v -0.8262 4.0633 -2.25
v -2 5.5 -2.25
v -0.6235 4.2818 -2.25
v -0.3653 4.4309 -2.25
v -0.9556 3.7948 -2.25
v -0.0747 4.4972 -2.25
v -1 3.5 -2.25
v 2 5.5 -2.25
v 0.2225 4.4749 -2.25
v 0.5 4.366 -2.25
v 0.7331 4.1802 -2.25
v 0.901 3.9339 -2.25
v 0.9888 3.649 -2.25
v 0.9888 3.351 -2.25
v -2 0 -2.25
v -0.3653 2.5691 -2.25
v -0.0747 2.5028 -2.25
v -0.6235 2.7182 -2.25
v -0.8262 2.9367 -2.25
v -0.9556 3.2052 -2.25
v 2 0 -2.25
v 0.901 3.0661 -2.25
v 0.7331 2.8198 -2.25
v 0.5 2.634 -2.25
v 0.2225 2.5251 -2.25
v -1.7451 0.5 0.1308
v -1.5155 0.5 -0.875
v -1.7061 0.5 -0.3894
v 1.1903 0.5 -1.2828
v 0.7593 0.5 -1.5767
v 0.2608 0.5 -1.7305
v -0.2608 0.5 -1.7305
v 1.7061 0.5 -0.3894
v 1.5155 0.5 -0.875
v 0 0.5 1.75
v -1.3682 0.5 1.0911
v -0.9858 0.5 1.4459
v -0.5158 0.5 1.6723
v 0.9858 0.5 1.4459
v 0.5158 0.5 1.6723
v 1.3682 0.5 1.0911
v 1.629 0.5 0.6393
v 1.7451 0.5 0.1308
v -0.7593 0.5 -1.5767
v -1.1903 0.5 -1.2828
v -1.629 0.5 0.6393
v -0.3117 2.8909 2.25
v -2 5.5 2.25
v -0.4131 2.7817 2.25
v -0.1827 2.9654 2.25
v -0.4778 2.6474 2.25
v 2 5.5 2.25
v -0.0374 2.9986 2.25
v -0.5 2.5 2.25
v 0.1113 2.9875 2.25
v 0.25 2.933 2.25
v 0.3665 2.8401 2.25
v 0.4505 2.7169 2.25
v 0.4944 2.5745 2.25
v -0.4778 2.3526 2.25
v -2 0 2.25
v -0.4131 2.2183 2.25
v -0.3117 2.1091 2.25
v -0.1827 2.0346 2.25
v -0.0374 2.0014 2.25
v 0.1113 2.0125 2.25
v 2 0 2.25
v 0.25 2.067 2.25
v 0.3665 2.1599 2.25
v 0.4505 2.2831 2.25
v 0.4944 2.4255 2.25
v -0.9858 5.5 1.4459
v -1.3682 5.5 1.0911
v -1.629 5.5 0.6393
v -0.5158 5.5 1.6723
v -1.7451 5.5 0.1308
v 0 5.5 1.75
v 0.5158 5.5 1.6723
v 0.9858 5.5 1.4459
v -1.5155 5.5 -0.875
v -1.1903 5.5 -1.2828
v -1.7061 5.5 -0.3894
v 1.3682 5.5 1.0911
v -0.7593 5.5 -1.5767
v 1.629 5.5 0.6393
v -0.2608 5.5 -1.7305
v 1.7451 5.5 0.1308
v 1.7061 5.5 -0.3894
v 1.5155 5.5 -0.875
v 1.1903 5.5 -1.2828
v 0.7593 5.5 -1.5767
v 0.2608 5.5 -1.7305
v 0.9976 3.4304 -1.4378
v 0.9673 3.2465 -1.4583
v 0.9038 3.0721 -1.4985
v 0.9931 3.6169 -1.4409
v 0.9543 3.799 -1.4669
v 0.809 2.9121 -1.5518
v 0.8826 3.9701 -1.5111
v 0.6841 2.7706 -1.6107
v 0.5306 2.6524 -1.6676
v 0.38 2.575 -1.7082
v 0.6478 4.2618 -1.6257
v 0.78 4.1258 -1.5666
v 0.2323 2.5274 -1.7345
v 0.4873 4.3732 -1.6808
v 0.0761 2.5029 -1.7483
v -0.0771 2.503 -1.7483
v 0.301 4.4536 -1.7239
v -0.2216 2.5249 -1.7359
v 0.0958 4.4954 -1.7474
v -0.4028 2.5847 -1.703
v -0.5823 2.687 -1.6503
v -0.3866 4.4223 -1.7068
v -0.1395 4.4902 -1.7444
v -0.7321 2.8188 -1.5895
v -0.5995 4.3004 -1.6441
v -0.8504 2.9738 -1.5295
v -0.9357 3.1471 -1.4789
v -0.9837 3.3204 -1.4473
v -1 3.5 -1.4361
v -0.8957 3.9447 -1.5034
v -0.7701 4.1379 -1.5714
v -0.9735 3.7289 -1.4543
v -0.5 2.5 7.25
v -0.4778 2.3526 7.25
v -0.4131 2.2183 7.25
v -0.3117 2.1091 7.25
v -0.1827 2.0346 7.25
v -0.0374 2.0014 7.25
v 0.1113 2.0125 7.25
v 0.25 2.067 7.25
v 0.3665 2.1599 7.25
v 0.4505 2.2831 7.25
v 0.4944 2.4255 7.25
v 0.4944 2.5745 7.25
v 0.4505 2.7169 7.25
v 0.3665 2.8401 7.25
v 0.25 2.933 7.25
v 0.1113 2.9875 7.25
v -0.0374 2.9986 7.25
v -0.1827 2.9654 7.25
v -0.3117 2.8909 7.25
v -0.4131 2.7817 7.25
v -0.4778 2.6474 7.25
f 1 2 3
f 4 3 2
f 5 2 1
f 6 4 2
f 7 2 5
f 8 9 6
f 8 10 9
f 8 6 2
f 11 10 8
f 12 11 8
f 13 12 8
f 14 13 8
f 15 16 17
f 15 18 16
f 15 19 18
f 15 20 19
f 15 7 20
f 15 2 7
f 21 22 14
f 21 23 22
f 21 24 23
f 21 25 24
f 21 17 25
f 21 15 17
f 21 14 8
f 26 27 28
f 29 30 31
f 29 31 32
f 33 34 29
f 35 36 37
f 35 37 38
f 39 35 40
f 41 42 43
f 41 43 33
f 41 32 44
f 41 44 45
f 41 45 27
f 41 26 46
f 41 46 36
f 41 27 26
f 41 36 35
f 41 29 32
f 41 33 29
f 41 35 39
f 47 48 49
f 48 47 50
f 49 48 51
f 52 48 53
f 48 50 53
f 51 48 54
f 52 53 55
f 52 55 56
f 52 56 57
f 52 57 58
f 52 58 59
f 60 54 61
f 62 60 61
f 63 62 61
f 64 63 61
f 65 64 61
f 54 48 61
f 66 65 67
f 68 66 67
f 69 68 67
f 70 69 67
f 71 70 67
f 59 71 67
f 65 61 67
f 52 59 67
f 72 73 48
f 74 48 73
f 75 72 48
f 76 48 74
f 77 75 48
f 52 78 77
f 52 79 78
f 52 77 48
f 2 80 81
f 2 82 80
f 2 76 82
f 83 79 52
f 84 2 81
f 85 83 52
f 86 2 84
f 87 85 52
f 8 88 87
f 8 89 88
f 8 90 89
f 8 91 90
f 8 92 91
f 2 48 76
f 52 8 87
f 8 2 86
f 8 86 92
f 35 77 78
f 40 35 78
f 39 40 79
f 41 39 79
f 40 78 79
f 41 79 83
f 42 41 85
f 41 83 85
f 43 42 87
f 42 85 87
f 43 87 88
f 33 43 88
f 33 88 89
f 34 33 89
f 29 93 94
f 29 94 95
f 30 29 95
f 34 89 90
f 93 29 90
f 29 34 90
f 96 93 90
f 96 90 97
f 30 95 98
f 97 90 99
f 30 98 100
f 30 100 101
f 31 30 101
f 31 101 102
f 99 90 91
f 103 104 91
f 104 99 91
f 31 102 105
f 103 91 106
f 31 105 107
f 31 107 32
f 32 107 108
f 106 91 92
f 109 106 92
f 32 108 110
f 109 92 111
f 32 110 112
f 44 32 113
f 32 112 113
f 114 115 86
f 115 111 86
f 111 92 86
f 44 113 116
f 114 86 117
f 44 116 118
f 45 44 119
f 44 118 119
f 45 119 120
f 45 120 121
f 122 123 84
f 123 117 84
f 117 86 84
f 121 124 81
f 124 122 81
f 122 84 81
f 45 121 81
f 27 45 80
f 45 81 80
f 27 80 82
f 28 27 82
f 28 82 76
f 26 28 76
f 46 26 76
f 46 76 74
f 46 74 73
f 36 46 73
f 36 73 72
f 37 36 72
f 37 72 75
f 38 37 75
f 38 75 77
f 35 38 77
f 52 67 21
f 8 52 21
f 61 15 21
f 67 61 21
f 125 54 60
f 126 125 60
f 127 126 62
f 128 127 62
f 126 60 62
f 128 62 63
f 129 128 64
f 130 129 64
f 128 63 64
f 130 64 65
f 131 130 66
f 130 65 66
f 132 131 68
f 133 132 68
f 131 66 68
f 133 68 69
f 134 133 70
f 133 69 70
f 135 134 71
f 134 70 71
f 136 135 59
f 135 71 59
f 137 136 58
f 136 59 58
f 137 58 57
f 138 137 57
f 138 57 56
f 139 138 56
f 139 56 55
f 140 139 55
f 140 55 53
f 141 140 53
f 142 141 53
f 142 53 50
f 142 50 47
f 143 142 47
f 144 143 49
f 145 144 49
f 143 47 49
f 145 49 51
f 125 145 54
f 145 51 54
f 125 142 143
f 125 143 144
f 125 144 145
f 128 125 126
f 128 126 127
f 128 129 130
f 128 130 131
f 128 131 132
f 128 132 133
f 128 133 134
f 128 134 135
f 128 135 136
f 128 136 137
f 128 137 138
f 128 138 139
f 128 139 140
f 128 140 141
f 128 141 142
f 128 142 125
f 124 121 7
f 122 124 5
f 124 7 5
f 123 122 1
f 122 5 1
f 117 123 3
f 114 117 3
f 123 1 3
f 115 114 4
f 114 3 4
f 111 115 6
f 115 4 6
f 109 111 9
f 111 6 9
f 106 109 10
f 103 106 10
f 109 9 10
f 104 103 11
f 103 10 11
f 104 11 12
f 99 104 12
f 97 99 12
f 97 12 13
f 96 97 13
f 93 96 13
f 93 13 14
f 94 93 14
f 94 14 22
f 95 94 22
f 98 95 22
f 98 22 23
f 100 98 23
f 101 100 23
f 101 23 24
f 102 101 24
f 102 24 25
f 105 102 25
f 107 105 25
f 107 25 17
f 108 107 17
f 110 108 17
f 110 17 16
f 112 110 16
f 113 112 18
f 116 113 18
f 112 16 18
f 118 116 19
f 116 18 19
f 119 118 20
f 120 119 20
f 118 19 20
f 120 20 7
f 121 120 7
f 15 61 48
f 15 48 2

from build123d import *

# Parameters (mm, degrees)
SKETCH4_W           = 4
SKETCH4_H           = 4.5
BOSS_EXTRUDE1_DEPTH = 5.5
SKETCH5_R           = 0.5
BOSS_EXTRUDE2_DEPTH = 5
SKETCH6_R           = 1.75
CUT_EXTRUDE1_DEPTH  = 5
SKETCH7_R           = 1
CUT_EXTRUDE2_DEPTH  = 2


with BuildPart() as part:
    # Sketch4 → Boss-Extrude1 (new body)
    with BuildSketch(Plane(origin=(0, 0, 0), x_dir=(1, 0, 0), z_dir=(0, 1, 0))):
        Rectangle(SKETCH4_W, SKETCH4_H)
    extrude(amount=BOSS_EXTRUDE1_DEPTH)

    # Sketch5 → Boss-Extrude2 (add)
    with BuildSketch(Plane.XY.offset(2.25)):
        with Locations(Location((0, 2.5, 0), (0, 0, 180))):
            Circle(SKETCH5_R)
    extrude(amount=BOSS_EXTRUDE2_DEPTH)

    # Sketch6 → Cut-Extrude1 (cut)
    with BuildSketch(Plane(origin=(0, 5.5, 0), x_dir=(1, 0, 0), z_dir=(0, 1, 0))):
        with Locations(Location((0, 0, 0), (0, 0, 270))):
            Circle(SKETCH6_R)
    extrude(amount=-CUT_EXTRUDE1_DEPTH, mode=Mode.SUBTRACT)

    # Sketch7 → Cut-Extrude2 (cut)
    with BuildSketch(Plane(origin=(0, 0, -2.25), x_dir=(-1, 0, 0), z_dir=(0, 0, -1))):
        with Locations((0, 3.5)):
            Circle(SKETCH7_R)
    extrude(amount=-CUT_EXTRUDE2_DEPTH, mode=Mode.SUBTRACT)


solid = part.part
